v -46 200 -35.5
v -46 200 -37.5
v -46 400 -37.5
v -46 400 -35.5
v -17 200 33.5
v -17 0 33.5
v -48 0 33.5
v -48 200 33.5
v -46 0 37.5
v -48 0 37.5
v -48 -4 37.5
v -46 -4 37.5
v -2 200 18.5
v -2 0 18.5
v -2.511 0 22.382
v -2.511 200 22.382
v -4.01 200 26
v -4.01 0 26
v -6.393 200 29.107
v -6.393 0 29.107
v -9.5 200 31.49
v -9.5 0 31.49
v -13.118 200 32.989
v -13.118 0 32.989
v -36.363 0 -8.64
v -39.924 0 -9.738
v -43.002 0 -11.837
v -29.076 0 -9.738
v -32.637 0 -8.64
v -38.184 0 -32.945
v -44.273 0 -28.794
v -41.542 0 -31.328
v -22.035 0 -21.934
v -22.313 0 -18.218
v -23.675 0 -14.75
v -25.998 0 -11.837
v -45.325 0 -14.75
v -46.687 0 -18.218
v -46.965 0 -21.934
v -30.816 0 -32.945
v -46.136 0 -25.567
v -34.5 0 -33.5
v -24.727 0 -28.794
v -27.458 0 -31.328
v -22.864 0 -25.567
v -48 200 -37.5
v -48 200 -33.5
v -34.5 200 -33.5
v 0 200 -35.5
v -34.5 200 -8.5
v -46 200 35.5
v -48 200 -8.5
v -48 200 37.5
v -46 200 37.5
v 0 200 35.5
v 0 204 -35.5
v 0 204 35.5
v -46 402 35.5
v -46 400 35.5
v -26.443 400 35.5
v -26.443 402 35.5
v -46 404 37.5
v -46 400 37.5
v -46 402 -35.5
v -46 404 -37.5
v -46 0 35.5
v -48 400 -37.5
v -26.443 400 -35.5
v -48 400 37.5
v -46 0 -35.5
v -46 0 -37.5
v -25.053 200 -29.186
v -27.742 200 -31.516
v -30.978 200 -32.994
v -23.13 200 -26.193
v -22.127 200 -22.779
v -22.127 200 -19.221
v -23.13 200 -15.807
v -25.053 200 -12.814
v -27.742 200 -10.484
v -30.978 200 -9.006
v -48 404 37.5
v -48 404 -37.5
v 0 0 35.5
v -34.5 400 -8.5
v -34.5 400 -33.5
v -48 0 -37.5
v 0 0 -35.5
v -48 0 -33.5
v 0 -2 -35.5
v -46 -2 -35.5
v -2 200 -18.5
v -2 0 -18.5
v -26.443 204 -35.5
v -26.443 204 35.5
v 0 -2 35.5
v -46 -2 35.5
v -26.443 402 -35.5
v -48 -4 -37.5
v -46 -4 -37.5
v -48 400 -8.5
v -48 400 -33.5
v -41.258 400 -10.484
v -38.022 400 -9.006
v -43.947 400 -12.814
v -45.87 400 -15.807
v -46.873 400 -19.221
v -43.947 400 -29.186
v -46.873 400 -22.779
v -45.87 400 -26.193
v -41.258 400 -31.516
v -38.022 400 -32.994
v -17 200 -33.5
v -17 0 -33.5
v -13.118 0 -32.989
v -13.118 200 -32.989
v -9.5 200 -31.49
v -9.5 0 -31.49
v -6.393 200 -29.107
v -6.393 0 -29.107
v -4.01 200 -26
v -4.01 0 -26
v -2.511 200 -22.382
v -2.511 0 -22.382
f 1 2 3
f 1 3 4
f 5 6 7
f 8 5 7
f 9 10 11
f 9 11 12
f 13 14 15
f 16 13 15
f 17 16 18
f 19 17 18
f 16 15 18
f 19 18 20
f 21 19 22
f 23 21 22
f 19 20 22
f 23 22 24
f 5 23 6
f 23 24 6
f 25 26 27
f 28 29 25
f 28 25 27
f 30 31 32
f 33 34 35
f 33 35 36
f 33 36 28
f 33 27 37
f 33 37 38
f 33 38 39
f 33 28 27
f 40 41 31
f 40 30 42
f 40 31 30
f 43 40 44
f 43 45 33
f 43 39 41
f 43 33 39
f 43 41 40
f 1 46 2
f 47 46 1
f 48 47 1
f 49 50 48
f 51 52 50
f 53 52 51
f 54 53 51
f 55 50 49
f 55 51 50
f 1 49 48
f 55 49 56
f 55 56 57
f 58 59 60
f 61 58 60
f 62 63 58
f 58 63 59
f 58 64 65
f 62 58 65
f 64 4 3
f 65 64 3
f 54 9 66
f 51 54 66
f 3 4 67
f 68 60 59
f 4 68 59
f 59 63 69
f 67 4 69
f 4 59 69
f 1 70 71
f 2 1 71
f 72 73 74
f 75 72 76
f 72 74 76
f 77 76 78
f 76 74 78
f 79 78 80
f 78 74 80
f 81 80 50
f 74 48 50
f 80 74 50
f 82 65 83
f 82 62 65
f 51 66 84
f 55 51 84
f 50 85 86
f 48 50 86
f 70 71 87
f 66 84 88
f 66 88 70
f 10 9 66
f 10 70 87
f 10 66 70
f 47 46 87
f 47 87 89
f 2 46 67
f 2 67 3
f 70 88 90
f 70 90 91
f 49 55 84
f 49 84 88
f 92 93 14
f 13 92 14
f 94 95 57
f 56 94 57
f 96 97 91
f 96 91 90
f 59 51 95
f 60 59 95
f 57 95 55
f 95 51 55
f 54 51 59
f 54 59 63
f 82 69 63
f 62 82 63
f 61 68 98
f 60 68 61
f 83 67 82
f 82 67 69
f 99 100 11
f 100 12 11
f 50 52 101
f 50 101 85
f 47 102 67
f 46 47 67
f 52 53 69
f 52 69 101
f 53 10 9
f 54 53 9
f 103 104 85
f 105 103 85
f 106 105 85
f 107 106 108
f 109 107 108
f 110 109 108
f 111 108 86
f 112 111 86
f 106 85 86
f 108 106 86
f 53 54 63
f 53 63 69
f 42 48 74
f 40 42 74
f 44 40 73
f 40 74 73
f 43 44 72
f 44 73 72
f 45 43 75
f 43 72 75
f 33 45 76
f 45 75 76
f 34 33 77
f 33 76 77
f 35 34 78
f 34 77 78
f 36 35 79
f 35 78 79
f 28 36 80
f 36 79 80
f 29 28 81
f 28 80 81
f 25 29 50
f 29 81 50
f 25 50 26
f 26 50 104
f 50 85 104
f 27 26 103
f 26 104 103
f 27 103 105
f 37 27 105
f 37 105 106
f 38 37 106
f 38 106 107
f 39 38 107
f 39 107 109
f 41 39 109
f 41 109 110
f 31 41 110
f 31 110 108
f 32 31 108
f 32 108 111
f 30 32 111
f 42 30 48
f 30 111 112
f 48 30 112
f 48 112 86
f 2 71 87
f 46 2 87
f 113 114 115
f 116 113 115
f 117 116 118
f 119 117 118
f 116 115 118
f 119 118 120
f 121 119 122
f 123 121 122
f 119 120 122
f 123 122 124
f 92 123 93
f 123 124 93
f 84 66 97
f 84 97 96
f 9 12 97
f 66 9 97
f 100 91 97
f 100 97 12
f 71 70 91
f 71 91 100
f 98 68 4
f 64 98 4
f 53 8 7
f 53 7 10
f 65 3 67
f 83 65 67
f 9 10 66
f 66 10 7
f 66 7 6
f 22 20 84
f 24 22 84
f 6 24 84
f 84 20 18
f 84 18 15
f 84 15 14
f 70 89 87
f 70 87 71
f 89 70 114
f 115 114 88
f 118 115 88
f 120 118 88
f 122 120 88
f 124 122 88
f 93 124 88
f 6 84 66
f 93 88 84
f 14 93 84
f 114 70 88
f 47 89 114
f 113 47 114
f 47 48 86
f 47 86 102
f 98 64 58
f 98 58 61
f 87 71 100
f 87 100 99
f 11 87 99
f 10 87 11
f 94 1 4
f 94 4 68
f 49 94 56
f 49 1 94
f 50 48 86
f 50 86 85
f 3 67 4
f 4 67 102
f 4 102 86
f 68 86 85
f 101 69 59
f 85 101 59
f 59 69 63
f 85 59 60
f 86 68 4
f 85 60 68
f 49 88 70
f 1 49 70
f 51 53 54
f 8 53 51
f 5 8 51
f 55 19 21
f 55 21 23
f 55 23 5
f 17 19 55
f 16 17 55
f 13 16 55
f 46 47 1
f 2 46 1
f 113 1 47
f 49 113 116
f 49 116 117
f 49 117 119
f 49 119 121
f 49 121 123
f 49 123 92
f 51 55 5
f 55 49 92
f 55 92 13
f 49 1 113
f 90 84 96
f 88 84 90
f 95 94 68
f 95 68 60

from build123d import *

# Parameters (mm, degrees)
BOSS_EXTRU_1_DEPTH      = 200
BOSS_EXTRU_2_DEPTH      = 200
ESQUISSE4_W             = 26.442514416
ESQUISSE4_H             = 71
BOSS_EXTRU_3_DEPTH      = 4
BOSS_EXTRU_5_DEPTH      = 4
ESQUISSE6_W             = 46
ESQUISSE6_H             = 71
ENL_V_MAT_EXTRU_1_DEPTH = 2
ESQUISSE7_W             = 26.442514416
ESQUISSE7_H             = 71
ENL_V_MAT_EXTRU_2_DEPTH = 5
ESQUISSE8_R             = 12.5
BOSS_EXTRU_6_DEPTH      = 400
ESQUISSE10_W            = 25
ESQUISSE10_H            = 200
ENL_V_MAT_EXTRU_3_DEPTH = 35.5


with BuildPart() as part:
    # Esquisse1 → Boss.-Extru.1 (new body)
    with BuildSketch(Plane(origin=(0, 0, 0), x_dir=(1, 0, 0), z_dir=(0, 1, 0))):
        with BuildLine():
            Line((-46, -35.5), (-17, -35.5))
            Line((-17, -35.5), (0, -35.5))
            Line((0, -35.5), (0, 35.5))
            Line((0, 35.5), (-46, 35.5))
            Line((-46, 35.5), (-46, 37.5))
            Line((-46, 37.5), (-48, 37.5))
            Line((-48, 37.5), (-48, 33.5))
            Line((-48, 33.5), (-17, 33.5))
            ThreePointArc((-17, 33.5), (-6.393398282, 29.106601718), (-2, 18.5))
            Line((-2, 18.5), (-2, -18.5))
            ThreePointArc((-2, -18.5), (-6.393398282, -29.106601718), (-17, -33.5))
            Line((-17, -33.5), (-48, -33.5))
            Line((-48, -33.5), (-48, -37.5))
            Line((-48, -37.5), (-46, -37.5))
            Line((-46, -37.5), (-46, -35.5))
        make_face()
    extrude(amount=BOSS_EXTRU_1_DEPTH)


with BuildPart() as body_2:
    # Esquisse2 → Boss.-Extru.2 (new body)
    with BuildSketch(Plane.XZ.offset(-200)):
        Polygon((-46, 37.5), (-48, 37.5), (-48, -8.5), (-34.5, -8.5), (-34.5, -33.5), (-48, -33.5), (-48, -37.5), (-46, -37.5), (-46, -35.5), (-26.442514416, -35.5), (-26.442514416, 35.5), (-46, 35.5), align=None)
    extrude(amount=-BOSS_EXTRU_2_DEPTH)

    # Esquisse4 → Boss.-Extru.3 (add)
    with BuildSketch(Plane.XZ.offset(-200)):
        with Locations((-13.221257208, 0)):
            Rectangle(ESQUISSE4_W, ESQUISSE4_H)
    extrude(amount=-BOSS_EXTRU_3_DEPTH)


with BuildPart() as body_3:
    # Esquisse5 → Boss.-Extru.5 (new body)
    with BuildSketch(Plane.XZ):
        Polygon((-48, -37.5), (-48, 37.5), (-46, 37.5), (-46, 35.5), (0, 35.5), (0, -35.5), (-46, -35.5), (-46, -37.5), align=None)
    extrude(amount=BOSS_EXTRU_5_DEPTH)

    # Esquisse6 → Enl_v. mat.-Extru.1 (cut)
    with BuildSketch(Plane.XZ.offset(4)):
        with Locations((-23, 0)):
            Rectangle(ESQUISSE6_W, ESQUISSE6_H)
    extrude(amount=-ENL_V_MAT_EXTRU_1_DEPTH, mode=Mode.SUBTRACT)


with BuildPart() as body_4:
    # Sym_trie1: mirrored copy
    add(body_3.part.mirror(Plane(origin=(0, 200, 0), x_dir=(0, 0, 1), z_dir=(0, -1, 0))))

    # Esquisse7 → Enl_v. mat.-Extru.2 (cut, through all)
    with BuildSketch(Plane.XZ.offset(-400)):
        with Locations((-13.221257208, 0)):
            Rectangle(ESQUISSE7_W, ESQUISSE7_H)
    extrude(amount=-ENL_V_MAT_EXTRU_2_DEPTH, mode=Mode.SUBTRACT)


with BuildPart() as body_5:
    # Esquisse8 → Boss.-Extru.6 (new body)
    with BuildSketch(Plane.XZ.offset(-400)):
        with Locations(Location((-34.5, -21, 0), (0, 0, 270))):  # turned: the seam where the file's is
            Circle(ESQUISSE8_R)
    extrude(amount=BOSS_EXTRU_6_DEPTH)

    # Esquisse10 → Enl_v. mat.-Extru.3 (cut, through all)
    with BuildSketch(Plane.ZY.offset(34.5)):
        with Locations((-21, 300)):
            Rectangle(ESQUISSE10_W, ESQUISSE10_H)
    extrude(amount=-ENL_V_MAT_EXTRU_3_DEPTH, mode=Mode.SUBTRACT)


solid = Compound([part.part, body_2.part, body_3.part, body_4.part, body_5.part])
